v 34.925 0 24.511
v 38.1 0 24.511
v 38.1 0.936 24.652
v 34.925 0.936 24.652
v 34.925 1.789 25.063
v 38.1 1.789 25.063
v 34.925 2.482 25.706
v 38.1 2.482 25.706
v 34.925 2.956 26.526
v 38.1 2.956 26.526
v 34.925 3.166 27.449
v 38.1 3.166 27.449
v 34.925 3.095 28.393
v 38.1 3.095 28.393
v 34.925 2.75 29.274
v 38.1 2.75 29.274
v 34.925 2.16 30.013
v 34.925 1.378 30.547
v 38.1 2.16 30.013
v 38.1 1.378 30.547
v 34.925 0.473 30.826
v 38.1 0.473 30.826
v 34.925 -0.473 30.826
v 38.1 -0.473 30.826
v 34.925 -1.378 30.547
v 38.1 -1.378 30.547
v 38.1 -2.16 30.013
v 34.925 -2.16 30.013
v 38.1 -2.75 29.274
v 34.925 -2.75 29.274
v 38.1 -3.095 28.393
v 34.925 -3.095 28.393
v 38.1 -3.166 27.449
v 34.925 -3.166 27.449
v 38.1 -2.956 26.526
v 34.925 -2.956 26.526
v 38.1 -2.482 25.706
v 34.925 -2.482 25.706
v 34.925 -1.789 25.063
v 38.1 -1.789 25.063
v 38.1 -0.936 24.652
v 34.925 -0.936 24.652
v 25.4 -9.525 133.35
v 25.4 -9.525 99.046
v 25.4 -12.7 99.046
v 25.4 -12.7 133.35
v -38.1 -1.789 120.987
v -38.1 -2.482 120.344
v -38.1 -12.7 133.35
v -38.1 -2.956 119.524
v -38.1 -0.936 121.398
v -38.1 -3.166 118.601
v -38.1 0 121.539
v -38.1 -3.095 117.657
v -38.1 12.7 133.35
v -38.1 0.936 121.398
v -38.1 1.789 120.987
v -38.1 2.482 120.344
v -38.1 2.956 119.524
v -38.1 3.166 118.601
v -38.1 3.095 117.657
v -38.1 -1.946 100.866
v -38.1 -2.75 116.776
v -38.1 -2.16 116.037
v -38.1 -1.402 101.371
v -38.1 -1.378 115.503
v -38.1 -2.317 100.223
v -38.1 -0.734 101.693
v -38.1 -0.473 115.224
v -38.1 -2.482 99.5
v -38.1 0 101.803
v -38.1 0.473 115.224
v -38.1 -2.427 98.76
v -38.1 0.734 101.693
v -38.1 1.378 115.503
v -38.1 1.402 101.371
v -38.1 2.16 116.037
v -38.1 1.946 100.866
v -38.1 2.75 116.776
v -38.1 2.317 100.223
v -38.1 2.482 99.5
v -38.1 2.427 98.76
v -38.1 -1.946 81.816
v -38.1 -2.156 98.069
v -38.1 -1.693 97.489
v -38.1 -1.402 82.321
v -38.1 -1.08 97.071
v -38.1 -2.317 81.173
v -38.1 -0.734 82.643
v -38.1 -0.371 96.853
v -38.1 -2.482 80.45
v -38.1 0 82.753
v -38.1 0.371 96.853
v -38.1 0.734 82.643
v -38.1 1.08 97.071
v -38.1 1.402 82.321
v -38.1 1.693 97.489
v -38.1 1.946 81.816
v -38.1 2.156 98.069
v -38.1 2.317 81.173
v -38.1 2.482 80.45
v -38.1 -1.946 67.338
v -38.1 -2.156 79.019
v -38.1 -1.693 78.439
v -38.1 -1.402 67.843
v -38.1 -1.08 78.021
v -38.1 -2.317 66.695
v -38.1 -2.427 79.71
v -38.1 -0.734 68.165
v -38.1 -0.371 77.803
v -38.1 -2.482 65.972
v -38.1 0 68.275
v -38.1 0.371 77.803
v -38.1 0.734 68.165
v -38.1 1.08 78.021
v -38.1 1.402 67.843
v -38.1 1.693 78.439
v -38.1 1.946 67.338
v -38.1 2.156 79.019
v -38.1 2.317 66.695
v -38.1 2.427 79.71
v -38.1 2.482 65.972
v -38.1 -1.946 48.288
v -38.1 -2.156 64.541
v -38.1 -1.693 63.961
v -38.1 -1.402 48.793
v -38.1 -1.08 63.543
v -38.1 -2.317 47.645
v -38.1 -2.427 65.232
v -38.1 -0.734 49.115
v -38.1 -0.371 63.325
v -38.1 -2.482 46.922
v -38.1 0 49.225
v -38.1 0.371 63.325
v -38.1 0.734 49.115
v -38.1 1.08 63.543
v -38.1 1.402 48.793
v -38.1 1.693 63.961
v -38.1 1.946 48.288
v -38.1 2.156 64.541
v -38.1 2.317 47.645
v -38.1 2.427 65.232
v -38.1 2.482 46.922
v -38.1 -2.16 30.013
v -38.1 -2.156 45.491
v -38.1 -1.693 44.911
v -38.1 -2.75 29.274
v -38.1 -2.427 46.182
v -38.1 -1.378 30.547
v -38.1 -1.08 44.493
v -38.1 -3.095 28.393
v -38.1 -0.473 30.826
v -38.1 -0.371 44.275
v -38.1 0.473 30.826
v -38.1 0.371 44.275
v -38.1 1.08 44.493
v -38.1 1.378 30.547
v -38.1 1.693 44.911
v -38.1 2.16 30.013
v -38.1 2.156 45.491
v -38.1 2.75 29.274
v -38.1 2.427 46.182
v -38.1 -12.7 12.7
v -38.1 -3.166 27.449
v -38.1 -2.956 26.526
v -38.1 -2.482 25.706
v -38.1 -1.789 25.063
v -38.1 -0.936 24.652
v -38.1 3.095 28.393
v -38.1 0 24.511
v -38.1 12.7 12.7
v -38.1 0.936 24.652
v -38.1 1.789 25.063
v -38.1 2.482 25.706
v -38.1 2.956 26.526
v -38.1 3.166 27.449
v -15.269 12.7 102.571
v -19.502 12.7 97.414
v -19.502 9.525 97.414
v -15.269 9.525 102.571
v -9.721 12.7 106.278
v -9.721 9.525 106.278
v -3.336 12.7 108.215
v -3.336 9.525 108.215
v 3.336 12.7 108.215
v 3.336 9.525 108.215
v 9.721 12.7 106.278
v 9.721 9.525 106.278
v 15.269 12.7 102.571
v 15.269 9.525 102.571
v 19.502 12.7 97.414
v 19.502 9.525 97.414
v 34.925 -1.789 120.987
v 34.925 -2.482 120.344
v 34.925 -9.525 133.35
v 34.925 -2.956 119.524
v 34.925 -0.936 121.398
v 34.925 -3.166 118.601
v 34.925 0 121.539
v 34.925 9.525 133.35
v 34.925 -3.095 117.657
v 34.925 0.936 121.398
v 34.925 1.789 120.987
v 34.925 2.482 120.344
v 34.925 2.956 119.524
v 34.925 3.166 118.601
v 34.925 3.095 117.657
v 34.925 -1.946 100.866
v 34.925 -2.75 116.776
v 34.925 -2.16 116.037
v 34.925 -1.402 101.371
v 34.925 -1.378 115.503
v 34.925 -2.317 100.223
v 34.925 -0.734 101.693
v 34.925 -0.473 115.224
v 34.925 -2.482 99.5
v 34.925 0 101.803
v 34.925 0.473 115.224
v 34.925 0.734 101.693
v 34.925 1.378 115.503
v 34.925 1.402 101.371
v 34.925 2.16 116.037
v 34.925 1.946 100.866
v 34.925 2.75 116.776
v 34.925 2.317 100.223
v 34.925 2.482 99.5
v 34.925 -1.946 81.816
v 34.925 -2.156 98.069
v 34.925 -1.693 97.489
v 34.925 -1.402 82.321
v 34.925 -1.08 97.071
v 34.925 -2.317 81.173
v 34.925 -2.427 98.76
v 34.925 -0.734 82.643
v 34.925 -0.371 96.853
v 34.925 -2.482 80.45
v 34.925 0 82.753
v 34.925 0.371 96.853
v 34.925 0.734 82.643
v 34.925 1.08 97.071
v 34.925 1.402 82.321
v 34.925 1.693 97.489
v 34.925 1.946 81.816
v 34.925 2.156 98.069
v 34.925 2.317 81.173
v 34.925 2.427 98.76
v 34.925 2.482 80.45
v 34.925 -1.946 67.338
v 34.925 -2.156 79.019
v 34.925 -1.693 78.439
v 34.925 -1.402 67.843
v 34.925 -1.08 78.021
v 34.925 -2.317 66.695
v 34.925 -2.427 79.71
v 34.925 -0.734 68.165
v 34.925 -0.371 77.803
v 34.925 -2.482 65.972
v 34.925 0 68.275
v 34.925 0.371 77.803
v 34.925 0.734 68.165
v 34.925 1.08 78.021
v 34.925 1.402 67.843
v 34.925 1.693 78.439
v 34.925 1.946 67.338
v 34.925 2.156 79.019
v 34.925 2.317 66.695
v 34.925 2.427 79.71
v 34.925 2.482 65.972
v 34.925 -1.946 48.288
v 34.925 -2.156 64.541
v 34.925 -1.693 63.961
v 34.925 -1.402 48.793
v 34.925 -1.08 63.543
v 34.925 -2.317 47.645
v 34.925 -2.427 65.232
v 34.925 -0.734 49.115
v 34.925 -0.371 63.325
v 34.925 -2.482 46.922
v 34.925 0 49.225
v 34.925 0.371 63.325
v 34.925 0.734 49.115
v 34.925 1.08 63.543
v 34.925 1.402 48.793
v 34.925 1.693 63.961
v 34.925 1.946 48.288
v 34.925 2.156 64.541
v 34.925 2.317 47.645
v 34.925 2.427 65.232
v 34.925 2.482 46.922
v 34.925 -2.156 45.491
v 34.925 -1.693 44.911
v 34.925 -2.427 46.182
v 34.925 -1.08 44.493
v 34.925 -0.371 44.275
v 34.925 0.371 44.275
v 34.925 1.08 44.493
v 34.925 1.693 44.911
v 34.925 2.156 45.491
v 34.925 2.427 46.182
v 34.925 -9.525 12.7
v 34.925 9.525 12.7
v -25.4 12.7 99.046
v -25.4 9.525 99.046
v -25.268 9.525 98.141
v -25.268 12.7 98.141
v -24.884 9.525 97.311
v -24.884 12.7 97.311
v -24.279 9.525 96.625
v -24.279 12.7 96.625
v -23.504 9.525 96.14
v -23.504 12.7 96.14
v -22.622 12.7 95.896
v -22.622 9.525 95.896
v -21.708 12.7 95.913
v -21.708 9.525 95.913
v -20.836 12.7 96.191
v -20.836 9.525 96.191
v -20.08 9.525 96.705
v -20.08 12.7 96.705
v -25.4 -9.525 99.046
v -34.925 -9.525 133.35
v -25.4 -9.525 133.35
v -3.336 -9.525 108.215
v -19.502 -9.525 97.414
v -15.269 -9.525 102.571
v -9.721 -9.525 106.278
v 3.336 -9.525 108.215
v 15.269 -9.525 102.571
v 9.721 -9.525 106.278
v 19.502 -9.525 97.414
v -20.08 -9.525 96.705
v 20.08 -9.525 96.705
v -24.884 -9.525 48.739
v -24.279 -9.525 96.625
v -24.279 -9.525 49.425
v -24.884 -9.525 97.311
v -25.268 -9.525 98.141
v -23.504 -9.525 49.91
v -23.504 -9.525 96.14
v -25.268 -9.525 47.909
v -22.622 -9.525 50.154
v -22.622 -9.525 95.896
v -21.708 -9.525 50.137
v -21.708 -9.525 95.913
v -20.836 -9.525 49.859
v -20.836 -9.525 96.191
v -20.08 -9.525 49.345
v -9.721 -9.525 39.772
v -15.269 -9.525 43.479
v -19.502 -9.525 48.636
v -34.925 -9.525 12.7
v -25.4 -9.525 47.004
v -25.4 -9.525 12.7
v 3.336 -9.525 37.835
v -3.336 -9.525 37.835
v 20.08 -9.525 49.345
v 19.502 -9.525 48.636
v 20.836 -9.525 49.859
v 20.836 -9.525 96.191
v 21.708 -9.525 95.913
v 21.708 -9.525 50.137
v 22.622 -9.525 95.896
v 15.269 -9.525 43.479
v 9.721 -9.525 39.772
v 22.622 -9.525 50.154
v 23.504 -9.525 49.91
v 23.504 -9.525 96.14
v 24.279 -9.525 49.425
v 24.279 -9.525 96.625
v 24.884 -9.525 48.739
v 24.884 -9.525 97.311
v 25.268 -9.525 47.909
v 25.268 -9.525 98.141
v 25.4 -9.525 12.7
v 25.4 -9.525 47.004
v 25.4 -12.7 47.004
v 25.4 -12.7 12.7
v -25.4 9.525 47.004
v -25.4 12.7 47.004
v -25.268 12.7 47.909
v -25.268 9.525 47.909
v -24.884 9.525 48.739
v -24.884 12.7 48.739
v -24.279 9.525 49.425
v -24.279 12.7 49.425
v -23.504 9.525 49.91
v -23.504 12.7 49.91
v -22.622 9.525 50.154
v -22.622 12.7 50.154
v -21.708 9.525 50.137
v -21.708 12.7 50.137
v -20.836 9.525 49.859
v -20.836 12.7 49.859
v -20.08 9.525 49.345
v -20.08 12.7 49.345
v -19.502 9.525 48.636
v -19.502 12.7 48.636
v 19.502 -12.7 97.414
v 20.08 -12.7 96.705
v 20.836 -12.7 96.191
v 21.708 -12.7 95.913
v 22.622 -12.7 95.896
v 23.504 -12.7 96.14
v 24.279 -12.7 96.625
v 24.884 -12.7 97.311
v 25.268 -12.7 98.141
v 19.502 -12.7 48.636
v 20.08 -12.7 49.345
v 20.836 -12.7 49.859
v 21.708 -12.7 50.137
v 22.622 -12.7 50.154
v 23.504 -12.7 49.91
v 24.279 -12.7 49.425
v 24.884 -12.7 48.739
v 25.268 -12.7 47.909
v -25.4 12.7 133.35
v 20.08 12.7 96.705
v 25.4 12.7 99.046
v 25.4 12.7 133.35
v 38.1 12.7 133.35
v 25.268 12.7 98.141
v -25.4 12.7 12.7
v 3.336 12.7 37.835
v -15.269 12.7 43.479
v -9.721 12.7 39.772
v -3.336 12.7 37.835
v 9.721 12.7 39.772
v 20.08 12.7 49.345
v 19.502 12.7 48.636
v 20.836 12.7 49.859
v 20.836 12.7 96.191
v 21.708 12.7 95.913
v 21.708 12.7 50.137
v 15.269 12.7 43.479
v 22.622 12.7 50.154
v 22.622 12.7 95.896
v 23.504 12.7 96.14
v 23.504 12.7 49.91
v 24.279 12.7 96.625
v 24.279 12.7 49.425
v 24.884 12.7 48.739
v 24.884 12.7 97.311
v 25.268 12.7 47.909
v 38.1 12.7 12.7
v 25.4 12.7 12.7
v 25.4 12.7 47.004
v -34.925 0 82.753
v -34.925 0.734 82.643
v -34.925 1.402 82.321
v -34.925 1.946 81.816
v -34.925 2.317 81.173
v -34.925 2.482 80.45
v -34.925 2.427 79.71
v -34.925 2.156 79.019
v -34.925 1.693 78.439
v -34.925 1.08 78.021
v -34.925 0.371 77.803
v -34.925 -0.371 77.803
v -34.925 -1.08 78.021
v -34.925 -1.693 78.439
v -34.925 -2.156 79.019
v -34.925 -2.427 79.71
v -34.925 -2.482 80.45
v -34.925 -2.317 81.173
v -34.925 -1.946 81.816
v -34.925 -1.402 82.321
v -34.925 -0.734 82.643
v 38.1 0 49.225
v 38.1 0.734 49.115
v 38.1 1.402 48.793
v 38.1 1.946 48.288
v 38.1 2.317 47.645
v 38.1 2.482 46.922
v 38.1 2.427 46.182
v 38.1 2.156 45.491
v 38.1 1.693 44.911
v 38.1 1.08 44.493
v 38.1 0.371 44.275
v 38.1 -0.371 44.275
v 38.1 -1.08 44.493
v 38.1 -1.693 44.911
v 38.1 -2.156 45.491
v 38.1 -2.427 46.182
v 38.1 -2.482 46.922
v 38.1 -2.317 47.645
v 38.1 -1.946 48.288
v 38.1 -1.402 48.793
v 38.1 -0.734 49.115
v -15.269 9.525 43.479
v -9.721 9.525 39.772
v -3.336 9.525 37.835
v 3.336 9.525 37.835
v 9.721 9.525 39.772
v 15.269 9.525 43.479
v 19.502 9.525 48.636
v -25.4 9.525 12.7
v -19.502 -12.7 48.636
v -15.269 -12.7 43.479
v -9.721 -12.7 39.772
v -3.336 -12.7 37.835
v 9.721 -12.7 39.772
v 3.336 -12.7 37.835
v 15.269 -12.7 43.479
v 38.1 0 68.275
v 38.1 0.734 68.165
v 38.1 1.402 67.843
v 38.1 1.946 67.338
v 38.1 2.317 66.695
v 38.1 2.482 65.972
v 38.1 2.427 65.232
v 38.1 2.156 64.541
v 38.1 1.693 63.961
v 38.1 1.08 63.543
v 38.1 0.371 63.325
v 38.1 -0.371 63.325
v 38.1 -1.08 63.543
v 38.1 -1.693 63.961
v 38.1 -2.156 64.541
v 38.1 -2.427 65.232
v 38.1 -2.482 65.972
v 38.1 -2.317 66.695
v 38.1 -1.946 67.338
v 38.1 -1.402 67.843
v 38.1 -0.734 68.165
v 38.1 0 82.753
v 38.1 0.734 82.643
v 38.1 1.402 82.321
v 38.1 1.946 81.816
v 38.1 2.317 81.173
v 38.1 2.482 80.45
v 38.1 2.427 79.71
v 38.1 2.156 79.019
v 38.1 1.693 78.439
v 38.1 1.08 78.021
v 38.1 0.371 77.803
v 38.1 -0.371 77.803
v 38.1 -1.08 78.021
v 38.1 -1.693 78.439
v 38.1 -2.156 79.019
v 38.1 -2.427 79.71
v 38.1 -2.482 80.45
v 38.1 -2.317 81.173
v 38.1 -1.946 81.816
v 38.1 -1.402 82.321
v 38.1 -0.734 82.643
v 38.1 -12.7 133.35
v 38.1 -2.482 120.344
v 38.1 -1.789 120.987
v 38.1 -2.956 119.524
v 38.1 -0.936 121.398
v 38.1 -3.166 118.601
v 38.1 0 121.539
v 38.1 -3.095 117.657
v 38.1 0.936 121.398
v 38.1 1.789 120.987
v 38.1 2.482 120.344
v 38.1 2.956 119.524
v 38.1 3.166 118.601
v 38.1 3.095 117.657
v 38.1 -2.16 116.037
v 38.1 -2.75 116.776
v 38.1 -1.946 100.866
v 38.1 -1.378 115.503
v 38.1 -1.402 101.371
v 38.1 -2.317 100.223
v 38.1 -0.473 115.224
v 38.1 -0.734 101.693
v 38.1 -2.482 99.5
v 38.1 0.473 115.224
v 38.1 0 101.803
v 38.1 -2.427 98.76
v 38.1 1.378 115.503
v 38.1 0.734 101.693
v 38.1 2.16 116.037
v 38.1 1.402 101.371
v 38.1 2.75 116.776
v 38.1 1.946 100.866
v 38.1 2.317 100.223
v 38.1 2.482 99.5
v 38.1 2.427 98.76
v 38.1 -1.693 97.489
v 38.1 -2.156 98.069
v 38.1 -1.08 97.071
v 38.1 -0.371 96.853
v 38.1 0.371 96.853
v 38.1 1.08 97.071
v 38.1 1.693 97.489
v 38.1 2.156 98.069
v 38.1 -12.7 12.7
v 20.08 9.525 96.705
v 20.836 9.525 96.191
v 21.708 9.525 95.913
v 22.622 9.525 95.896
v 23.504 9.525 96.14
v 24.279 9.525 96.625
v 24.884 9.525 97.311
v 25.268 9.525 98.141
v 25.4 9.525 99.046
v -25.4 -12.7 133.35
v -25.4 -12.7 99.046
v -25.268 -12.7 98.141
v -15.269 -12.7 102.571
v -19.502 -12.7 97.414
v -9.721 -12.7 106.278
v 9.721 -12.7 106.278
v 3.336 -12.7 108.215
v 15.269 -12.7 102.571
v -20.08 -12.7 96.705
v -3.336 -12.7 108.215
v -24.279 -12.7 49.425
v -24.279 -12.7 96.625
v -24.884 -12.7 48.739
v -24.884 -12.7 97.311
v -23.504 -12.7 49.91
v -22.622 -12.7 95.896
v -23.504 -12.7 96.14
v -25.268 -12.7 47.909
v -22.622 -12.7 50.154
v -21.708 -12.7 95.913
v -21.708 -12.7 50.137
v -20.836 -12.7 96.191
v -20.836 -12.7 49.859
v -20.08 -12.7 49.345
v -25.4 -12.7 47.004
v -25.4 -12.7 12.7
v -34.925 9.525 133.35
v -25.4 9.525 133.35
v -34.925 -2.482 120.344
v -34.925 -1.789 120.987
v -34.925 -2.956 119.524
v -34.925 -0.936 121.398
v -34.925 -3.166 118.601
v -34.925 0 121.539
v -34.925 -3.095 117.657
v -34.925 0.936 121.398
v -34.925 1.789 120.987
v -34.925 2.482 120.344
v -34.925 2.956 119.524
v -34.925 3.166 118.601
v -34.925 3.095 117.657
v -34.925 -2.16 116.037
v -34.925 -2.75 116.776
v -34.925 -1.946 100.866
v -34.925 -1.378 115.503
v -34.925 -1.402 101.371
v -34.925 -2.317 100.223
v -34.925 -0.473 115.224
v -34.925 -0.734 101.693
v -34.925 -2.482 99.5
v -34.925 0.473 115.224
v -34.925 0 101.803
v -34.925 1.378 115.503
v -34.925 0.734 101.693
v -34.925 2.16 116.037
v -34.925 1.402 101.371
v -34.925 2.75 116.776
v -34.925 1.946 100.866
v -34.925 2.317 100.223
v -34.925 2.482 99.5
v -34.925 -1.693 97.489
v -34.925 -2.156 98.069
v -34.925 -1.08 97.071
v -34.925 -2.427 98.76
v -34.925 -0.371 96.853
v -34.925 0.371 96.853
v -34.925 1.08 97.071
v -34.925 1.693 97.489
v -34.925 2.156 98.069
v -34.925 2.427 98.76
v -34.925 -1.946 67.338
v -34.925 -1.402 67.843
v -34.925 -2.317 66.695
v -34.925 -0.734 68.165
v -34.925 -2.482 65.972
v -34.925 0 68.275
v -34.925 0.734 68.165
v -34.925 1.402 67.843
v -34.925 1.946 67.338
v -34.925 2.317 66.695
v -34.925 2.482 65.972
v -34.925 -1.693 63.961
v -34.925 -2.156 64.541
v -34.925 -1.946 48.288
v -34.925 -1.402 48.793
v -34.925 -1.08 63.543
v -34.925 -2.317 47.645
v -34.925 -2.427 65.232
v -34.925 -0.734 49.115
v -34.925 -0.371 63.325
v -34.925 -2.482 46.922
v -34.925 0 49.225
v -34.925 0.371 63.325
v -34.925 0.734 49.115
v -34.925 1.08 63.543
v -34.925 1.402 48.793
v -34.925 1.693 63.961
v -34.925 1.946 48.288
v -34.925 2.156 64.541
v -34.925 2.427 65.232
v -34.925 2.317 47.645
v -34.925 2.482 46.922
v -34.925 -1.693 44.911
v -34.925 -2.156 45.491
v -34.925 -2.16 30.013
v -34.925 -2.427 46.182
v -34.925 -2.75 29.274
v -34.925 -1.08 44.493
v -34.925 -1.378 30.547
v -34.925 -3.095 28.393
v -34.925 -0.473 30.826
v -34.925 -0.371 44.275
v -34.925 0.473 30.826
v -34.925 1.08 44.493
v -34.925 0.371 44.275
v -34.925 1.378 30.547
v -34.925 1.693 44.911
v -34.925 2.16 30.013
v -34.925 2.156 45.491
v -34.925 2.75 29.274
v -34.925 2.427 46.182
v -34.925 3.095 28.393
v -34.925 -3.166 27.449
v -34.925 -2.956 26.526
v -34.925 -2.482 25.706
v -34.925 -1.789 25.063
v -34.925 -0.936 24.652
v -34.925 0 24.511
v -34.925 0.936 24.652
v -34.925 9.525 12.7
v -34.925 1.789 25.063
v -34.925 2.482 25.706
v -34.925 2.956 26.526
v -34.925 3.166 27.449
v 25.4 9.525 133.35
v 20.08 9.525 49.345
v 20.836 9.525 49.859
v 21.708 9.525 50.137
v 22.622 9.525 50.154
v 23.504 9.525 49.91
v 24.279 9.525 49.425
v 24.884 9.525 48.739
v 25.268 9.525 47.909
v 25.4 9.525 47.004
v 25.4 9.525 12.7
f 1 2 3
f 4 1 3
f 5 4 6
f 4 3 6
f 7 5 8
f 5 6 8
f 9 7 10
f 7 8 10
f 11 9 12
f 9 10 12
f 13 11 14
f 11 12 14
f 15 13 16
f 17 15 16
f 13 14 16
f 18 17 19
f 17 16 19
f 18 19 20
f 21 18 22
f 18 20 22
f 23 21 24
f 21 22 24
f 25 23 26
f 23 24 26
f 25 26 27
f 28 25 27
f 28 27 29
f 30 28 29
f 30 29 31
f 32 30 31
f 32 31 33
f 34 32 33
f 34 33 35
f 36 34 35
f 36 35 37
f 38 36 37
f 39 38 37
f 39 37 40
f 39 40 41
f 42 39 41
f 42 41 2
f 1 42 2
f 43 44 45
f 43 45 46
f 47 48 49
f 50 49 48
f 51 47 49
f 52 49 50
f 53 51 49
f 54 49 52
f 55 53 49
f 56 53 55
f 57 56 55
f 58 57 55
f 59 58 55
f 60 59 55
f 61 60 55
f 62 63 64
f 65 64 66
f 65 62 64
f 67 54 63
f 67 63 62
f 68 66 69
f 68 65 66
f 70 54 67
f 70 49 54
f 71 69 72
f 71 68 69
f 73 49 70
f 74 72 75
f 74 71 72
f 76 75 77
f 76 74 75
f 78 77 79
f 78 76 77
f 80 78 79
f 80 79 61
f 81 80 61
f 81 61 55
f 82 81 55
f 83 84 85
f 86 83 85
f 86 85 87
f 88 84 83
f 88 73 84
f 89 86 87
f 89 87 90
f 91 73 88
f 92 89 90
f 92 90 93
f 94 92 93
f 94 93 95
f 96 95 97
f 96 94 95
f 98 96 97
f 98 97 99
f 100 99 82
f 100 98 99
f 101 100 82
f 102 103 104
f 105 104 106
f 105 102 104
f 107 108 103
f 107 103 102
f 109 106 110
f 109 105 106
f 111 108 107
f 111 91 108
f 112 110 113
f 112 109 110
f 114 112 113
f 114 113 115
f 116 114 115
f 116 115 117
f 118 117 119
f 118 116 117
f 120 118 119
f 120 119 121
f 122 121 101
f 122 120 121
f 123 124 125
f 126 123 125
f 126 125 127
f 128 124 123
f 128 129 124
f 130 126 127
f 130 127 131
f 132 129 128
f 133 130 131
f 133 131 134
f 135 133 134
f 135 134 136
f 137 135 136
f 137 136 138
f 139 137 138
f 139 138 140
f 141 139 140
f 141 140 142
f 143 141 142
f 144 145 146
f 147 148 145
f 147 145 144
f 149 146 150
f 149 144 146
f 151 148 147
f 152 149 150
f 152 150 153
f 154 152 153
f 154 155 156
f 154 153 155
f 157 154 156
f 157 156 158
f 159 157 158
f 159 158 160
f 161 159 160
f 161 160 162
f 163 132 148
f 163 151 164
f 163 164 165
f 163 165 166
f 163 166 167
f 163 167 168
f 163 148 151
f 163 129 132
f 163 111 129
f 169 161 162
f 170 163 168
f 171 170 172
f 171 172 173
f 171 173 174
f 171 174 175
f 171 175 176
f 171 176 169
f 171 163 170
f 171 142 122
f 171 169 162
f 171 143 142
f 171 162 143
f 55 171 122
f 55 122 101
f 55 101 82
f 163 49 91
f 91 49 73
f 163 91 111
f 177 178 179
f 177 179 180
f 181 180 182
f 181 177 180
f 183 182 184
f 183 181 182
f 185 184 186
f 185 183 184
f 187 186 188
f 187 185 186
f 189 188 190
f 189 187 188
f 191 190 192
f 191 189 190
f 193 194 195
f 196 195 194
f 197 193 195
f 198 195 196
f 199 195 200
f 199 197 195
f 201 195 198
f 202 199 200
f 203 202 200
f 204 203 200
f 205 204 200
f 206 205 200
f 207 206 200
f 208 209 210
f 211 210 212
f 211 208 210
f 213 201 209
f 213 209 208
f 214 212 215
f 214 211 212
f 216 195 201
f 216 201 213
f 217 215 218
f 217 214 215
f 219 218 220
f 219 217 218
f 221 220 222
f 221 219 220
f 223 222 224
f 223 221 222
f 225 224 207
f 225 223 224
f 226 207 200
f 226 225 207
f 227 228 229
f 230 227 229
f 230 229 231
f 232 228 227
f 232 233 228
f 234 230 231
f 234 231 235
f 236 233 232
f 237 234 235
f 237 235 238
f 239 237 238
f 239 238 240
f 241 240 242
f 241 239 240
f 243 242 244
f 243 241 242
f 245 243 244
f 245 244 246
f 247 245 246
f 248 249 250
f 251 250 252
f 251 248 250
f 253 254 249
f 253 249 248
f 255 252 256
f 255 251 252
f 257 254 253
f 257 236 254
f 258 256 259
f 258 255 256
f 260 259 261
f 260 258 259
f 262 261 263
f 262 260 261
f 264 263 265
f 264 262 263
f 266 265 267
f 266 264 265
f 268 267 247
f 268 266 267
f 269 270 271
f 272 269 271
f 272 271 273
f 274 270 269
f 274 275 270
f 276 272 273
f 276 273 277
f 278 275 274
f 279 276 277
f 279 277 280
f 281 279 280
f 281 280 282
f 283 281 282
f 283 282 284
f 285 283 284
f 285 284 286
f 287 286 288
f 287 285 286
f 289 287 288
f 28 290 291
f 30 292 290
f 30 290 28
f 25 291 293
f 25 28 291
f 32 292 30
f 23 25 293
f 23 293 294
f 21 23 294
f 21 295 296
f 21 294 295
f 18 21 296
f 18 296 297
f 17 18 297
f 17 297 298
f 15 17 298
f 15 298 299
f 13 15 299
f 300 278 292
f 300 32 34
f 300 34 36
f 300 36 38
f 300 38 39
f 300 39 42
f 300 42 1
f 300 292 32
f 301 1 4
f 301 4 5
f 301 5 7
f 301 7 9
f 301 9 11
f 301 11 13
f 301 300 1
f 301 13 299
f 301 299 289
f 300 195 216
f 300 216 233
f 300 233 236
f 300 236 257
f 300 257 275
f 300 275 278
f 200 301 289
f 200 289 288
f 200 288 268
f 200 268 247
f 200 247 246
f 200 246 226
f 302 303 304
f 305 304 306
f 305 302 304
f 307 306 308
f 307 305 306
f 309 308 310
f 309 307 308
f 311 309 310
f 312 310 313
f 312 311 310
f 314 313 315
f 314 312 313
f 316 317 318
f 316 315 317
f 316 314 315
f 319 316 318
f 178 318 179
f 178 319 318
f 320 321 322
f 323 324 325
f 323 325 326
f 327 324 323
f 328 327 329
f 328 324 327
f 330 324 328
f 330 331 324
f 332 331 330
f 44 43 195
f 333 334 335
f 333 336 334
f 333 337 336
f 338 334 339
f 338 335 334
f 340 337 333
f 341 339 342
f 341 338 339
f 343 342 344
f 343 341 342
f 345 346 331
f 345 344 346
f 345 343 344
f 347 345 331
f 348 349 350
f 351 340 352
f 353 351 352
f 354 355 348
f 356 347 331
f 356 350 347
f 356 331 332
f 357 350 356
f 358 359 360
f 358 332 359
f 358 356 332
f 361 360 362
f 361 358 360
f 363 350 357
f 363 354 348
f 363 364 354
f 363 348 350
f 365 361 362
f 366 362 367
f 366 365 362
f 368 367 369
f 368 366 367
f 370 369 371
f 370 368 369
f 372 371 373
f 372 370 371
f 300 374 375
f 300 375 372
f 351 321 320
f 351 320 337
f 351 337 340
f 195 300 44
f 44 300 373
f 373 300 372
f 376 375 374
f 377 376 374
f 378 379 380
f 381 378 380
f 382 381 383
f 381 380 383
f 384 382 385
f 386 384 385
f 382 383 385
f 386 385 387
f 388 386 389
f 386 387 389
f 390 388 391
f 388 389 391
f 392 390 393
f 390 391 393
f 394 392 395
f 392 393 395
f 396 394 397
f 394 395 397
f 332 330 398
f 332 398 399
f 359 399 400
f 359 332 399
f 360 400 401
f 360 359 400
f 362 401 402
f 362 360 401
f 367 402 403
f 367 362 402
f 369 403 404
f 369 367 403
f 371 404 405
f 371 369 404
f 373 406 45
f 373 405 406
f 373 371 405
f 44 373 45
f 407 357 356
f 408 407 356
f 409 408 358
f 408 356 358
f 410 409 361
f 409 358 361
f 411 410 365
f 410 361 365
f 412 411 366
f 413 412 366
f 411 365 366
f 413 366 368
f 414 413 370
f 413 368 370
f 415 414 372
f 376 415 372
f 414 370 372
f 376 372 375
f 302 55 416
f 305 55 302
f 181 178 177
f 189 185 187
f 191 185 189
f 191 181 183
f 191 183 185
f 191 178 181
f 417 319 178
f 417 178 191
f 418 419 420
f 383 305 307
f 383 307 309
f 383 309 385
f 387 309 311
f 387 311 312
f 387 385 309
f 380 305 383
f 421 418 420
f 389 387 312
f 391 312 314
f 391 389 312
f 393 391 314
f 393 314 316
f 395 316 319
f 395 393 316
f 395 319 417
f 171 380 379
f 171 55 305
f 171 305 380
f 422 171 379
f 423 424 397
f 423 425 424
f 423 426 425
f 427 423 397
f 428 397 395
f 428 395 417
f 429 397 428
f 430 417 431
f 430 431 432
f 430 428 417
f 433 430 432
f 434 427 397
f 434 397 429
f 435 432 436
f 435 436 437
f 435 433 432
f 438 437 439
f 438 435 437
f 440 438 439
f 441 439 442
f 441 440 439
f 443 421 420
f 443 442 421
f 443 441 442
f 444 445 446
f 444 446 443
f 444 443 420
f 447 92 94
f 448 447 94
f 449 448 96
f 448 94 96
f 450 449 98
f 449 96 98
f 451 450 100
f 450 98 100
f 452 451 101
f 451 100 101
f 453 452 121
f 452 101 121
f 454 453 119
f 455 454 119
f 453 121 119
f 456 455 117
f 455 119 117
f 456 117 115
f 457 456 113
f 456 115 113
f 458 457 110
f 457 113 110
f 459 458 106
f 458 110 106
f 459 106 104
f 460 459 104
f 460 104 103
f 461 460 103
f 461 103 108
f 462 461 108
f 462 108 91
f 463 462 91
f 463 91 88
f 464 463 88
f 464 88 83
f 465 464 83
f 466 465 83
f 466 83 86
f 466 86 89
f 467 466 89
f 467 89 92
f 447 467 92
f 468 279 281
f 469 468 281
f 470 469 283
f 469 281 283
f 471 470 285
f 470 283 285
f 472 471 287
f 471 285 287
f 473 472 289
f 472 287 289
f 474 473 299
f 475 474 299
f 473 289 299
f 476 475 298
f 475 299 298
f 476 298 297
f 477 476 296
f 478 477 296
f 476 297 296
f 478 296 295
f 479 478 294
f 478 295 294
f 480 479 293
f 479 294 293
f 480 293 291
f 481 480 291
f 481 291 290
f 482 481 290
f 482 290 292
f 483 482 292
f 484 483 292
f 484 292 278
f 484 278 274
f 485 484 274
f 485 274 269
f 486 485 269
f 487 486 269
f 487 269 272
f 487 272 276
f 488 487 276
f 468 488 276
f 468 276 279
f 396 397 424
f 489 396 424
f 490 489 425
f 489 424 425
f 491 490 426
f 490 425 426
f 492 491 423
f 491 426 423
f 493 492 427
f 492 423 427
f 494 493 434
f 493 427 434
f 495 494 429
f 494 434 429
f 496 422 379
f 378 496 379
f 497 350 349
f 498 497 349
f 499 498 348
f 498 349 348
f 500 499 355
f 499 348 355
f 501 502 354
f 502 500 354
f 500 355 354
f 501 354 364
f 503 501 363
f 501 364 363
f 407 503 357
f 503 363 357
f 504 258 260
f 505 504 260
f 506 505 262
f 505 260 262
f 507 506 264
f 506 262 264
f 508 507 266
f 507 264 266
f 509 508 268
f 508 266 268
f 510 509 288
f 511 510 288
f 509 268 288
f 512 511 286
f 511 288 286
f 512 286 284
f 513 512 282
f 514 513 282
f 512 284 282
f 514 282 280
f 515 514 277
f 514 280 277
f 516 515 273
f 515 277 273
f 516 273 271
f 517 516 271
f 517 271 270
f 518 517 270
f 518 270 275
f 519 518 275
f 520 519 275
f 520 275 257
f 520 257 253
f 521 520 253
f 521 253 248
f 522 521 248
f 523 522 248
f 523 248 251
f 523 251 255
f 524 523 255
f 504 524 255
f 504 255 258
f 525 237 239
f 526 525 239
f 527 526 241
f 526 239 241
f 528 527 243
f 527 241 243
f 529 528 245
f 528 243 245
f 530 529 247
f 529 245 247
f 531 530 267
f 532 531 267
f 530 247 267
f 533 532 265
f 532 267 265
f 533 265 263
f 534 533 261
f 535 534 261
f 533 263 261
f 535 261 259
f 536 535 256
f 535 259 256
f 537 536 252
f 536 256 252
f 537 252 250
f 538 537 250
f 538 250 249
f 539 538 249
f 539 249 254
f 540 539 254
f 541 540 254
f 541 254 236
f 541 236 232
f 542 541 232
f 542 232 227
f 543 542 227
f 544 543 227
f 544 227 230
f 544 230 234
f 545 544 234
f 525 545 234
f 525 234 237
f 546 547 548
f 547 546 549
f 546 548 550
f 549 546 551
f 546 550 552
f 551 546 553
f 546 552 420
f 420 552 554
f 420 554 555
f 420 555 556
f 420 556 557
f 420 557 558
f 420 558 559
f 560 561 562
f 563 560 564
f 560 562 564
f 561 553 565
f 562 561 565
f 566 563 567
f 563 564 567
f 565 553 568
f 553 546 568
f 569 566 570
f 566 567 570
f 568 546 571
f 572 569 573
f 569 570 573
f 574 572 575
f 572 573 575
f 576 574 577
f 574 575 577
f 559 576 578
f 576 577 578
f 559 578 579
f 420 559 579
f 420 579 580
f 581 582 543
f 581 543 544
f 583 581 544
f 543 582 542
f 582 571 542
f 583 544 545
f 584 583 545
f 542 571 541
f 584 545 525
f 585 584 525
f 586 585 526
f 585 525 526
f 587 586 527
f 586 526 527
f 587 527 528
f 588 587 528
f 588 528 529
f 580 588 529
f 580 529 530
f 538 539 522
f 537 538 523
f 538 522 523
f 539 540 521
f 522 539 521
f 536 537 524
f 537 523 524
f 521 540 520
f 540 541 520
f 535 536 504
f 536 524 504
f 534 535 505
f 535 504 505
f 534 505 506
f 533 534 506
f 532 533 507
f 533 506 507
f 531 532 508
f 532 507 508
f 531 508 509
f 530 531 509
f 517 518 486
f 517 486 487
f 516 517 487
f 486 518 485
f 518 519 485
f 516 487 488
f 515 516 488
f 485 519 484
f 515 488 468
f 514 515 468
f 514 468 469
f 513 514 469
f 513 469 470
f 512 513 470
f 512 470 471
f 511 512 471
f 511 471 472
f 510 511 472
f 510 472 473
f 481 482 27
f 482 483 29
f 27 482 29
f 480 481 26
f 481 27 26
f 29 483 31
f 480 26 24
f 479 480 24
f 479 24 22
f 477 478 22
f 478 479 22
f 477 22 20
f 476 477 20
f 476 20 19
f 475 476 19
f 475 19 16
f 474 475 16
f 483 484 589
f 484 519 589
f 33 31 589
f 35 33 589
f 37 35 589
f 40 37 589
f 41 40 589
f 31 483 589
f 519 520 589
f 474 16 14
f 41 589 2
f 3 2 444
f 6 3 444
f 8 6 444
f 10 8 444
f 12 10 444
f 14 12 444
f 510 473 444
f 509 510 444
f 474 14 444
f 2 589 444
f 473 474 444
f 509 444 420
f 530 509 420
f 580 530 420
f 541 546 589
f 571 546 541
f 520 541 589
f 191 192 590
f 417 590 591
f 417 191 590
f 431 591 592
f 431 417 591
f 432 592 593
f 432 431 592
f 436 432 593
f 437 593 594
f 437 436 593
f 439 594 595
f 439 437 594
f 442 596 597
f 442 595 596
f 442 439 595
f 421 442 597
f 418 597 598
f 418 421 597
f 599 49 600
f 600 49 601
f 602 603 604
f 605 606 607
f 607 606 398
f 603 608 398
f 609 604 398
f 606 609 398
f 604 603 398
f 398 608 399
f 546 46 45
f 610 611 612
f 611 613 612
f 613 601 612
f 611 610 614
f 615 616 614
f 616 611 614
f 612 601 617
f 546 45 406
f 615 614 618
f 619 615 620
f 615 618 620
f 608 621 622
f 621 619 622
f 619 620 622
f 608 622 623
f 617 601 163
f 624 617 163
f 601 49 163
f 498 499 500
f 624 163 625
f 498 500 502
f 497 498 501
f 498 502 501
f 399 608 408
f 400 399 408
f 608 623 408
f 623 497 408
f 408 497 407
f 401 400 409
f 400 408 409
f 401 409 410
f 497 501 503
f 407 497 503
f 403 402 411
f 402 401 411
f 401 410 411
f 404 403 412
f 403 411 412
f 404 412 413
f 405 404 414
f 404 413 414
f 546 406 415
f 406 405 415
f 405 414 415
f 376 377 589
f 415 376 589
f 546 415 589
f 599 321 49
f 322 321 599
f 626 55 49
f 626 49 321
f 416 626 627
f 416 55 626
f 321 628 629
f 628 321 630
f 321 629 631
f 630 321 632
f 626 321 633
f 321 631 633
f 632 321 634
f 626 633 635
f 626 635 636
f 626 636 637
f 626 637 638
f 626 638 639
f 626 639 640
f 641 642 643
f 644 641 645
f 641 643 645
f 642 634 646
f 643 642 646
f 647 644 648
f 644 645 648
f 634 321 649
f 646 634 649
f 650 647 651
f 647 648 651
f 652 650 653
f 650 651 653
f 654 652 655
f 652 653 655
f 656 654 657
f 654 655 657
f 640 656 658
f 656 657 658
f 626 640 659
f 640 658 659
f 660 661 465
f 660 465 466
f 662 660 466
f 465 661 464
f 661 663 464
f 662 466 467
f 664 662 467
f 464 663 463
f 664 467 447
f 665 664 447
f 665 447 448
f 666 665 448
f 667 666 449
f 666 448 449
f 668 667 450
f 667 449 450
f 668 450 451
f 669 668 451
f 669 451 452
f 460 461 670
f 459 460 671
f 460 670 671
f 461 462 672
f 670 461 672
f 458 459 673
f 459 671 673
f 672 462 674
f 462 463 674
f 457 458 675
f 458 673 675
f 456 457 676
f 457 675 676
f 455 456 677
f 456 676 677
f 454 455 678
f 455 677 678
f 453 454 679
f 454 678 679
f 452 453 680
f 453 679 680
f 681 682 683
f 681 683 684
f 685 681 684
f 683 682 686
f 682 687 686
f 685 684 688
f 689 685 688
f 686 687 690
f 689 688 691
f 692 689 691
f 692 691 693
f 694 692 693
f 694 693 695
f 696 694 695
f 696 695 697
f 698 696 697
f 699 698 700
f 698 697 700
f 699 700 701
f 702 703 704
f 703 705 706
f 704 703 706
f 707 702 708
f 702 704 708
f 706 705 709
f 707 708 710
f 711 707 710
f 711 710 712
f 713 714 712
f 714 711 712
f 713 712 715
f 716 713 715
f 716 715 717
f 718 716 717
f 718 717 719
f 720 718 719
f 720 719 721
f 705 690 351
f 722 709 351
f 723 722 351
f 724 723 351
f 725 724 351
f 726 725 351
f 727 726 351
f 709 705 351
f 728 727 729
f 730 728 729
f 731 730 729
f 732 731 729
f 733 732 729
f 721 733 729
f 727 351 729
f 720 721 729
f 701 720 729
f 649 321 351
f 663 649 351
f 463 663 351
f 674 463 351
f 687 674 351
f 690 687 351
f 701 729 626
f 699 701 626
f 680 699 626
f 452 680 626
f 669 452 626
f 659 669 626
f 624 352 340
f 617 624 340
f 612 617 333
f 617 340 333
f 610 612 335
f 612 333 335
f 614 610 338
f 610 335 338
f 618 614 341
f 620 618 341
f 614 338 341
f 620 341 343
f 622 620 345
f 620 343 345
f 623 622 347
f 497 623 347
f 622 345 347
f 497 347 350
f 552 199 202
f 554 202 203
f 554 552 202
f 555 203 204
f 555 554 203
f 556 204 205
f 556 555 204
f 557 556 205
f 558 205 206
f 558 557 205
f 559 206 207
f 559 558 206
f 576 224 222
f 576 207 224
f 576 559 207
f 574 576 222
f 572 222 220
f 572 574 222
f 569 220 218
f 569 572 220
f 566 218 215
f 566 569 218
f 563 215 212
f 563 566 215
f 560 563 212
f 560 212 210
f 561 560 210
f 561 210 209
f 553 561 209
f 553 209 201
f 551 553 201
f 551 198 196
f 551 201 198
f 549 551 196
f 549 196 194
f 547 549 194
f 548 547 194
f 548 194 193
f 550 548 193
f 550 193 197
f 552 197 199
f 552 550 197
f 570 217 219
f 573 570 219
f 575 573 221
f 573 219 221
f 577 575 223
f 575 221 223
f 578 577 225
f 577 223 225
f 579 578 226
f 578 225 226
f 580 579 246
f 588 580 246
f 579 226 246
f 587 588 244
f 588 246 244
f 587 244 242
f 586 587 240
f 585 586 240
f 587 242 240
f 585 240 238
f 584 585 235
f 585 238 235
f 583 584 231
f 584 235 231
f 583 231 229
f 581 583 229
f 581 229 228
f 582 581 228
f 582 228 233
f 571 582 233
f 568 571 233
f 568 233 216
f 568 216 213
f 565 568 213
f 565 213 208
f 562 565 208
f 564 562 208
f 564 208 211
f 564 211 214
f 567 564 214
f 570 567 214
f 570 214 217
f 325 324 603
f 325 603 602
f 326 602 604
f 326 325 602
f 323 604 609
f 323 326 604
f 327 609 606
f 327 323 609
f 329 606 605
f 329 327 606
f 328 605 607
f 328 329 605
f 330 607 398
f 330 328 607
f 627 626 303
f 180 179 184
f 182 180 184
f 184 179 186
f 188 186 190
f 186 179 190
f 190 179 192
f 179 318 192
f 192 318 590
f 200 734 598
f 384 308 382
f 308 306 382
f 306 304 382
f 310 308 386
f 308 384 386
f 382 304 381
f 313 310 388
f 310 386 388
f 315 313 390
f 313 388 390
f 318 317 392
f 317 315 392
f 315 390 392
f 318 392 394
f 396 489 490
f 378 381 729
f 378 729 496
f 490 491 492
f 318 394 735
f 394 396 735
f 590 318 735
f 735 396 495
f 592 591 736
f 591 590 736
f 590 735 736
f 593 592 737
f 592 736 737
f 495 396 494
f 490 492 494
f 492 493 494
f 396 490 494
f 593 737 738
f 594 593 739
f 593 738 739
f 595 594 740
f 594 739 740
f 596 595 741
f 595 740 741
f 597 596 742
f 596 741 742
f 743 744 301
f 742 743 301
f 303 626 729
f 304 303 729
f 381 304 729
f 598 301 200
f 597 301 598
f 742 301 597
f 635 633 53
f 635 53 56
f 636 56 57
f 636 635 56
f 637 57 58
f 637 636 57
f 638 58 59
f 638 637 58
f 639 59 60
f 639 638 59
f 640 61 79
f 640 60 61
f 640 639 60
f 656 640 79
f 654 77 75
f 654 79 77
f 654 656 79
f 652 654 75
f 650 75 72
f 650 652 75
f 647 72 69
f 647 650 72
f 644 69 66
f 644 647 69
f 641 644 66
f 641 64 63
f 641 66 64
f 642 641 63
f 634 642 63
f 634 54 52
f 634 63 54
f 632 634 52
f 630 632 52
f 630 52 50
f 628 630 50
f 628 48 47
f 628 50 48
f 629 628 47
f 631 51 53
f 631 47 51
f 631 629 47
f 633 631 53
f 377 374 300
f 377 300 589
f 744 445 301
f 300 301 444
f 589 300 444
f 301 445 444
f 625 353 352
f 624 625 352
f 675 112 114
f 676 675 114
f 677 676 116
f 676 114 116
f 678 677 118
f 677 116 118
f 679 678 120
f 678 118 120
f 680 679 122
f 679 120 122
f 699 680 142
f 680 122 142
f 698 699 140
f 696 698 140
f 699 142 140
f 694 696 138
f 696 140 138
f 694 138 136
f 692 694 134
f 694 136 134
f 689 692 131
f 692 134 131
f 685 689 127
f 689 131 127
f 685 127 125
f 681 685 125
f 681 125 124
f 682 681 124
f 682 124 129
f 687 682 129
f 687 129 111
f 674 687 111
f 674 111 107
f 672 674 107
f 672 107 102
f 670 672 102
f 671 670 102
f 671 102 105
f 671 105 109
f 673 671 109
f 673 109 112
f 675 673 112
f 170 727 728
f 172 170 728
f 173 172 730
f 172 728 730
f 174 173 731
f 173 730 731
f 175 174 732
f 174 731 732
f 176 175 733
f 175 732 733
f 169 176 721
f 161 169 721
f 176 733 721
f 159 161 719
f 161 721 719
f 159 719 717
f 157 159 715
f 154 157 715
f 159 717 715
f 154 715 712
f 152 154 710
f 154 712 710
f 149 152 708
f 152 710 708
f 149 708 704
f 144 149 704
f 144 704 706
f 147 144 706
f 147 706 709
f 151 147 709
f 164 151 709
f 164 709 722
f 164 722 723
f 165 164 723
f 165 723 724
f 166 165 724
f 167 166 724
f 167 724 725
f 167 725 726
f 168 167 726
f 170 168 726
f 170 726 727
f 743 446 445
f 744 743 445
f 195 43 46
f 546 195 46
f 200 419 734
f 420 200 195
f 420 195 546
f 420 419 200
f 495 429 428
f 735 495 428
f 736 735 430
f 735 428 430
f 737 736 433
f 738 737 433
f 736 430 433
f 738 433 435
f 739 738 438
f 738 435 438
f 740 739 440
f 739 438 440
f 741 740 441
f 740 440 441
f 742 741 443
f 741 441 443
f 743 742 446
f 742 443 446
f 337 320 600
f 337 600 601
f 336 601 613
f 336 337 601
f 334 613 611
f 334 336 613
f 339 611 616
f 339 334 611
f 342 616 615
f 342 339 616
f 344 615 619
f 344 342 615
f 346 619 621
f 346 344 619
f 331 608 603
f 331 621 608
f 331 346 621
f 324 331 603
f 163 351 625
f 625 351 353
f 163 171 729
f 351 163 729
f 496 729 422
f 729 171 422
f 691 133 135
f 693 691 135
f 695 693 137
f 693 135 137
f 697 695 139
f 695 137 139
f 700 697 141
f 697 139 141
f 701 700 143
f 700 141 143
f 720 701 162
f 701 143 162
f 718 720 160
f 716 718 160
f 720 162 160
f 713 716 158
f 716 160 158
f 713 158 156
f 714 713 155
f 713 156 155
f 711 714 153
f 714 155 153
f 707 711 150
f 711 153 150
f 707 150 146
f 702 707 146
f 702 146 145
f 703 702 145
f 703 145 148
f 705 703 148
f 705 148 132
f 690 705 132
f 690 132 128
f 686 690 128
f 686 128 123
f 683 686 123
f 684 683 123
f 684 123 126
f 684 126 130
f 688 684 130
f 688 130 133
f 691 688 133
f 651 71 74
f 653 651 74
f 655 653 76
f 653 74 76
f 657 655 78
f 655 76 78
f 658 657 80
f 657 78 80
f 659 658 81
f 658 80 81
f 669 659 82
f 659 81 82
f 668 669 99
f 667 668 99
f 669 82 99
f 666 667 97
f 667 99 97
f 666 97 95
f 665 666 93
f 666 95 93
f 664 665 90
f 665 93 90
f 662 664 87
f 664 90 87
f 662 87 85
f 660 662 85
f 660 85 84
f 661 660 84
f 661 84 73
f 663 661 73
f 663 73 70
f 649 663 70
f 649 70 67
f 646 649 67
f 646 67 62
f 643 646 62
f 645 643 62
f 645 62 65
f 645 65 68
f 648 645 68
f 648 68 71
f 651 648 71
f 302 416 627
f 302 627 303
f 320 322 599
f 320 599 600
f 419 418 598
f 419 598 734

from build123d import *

# Parameters (mm, degrees)
SKETCH1_W           = 76.2
SKETCH1_H           = 25.4
SKETCH1_W_2         = 69.85
SKETCH1_H_2         = 19.05
EXTRUDE_THIN1_DEPTH = 146.05
CUT_EXTRUDE7_DEPTH  = 26.4
SKETCH7_R           = 3.175
CUT_EXTRUDE8_DEPTH  = 77.2
SKETCH8_R           = 2.4892
CUT_EXTRUDE9_DEPTH  = 77.2


with BuildPart() as part:
    # Sketch1 → Extrude-Thin1 (new body)
    with BuildSketch(Plane.XY):
        Rectangle(SKETCH1_W, SKETCH1_H)
        Rectangle(SKETCH1_W_2, SKETCH1_H_2, mode=Mode.SUBTRACT)
    extrude(amount=EXTRUDE_THIN1_DEPTH)

    # Sketch6 → Cut-Extrude7 (cut, through all)
    with BuildSketch(Plane(origin=(0, 12.7, 0), x_dir=(1, 0, 0), z_dir=(0, 1, 0))):
        with BuildLine():
            Line((-38.1, 0), (-38.1, -12.7))
            Line((-38.1, -12.7), (-25.4, -12.7))
            Line((-25.4, -12.7), (-25.4, -47.004160739))
            ThreePointArc((-25.4, -47.004160739), (-23.071797148, -50.064154136), (-19.501694746, -48.636408727))
            ThreePointArc((-19.501694746, -48.636408727), (0, -37.588701622), (19.501694746, -48.636408727))
            ThreePointArc((19.501694746, -48.636408727), (23.071797148, -50.064154136), (25.4, -47.004160739))
            Line((25.4, -47.004160739), (25.4, -12.7))
            Line((25.4, -12.7), (38.1, -12.7))
            Line((38.1, -12.7), (38.1, 0))
            Line((38.1, 0), (-38.1, 0))
        make_face()
    cut_extrude7 = extrude(amount=-CUT_EXTRUDE7_DEPTH, mode=Mode.SUBTRACT)

    # Sketch7 → Cut-Extrude8 (cut, through all)
    with BuildSketch(Plane(origin=(38.1, 0, 0), x_dir=(0, 0, -1), z_dir=(1, 0, 0))):
        with Locations((-27.686, 0)):
            Circle(SKETCH7_R)
    cut_extrude8 = extrude(amount=-CUT_EXTRUDE8_DEPTH, mode=Mode.SUBTRACT)

    # Mirror3: Cut-Extrude7, Cut-Extrude8 across plane
    add(cut_extrude7.mirror(Plane.XY.offset(73.025)), mode=Mode.SUBTRACT)
    add(cut_extrude8.mirror(Plane.XY.offset(73.025)), mode=Mode.SUBTRACT)

    # Sketch8 → Cut-Extrude9 (cut, through all)
    with BuildSketch(Plane.ZY.offset(38.1)):
        with Locations((46.736, 0)):
            Circle(SKETCH8_R)
        with Locations((99.314, 0)):
            Circle(SKETCH8_R)
        with Locations((80.264, 0)):
            Circle(SKETCH8_R)
        with Locations((65.786, 0)):
            Circle(SKETCH8_R)
    extrude(amount=-CUT_EXTRUDE9_DEPTH, mode=Mode.SUBTRACT)


solid = part.part
